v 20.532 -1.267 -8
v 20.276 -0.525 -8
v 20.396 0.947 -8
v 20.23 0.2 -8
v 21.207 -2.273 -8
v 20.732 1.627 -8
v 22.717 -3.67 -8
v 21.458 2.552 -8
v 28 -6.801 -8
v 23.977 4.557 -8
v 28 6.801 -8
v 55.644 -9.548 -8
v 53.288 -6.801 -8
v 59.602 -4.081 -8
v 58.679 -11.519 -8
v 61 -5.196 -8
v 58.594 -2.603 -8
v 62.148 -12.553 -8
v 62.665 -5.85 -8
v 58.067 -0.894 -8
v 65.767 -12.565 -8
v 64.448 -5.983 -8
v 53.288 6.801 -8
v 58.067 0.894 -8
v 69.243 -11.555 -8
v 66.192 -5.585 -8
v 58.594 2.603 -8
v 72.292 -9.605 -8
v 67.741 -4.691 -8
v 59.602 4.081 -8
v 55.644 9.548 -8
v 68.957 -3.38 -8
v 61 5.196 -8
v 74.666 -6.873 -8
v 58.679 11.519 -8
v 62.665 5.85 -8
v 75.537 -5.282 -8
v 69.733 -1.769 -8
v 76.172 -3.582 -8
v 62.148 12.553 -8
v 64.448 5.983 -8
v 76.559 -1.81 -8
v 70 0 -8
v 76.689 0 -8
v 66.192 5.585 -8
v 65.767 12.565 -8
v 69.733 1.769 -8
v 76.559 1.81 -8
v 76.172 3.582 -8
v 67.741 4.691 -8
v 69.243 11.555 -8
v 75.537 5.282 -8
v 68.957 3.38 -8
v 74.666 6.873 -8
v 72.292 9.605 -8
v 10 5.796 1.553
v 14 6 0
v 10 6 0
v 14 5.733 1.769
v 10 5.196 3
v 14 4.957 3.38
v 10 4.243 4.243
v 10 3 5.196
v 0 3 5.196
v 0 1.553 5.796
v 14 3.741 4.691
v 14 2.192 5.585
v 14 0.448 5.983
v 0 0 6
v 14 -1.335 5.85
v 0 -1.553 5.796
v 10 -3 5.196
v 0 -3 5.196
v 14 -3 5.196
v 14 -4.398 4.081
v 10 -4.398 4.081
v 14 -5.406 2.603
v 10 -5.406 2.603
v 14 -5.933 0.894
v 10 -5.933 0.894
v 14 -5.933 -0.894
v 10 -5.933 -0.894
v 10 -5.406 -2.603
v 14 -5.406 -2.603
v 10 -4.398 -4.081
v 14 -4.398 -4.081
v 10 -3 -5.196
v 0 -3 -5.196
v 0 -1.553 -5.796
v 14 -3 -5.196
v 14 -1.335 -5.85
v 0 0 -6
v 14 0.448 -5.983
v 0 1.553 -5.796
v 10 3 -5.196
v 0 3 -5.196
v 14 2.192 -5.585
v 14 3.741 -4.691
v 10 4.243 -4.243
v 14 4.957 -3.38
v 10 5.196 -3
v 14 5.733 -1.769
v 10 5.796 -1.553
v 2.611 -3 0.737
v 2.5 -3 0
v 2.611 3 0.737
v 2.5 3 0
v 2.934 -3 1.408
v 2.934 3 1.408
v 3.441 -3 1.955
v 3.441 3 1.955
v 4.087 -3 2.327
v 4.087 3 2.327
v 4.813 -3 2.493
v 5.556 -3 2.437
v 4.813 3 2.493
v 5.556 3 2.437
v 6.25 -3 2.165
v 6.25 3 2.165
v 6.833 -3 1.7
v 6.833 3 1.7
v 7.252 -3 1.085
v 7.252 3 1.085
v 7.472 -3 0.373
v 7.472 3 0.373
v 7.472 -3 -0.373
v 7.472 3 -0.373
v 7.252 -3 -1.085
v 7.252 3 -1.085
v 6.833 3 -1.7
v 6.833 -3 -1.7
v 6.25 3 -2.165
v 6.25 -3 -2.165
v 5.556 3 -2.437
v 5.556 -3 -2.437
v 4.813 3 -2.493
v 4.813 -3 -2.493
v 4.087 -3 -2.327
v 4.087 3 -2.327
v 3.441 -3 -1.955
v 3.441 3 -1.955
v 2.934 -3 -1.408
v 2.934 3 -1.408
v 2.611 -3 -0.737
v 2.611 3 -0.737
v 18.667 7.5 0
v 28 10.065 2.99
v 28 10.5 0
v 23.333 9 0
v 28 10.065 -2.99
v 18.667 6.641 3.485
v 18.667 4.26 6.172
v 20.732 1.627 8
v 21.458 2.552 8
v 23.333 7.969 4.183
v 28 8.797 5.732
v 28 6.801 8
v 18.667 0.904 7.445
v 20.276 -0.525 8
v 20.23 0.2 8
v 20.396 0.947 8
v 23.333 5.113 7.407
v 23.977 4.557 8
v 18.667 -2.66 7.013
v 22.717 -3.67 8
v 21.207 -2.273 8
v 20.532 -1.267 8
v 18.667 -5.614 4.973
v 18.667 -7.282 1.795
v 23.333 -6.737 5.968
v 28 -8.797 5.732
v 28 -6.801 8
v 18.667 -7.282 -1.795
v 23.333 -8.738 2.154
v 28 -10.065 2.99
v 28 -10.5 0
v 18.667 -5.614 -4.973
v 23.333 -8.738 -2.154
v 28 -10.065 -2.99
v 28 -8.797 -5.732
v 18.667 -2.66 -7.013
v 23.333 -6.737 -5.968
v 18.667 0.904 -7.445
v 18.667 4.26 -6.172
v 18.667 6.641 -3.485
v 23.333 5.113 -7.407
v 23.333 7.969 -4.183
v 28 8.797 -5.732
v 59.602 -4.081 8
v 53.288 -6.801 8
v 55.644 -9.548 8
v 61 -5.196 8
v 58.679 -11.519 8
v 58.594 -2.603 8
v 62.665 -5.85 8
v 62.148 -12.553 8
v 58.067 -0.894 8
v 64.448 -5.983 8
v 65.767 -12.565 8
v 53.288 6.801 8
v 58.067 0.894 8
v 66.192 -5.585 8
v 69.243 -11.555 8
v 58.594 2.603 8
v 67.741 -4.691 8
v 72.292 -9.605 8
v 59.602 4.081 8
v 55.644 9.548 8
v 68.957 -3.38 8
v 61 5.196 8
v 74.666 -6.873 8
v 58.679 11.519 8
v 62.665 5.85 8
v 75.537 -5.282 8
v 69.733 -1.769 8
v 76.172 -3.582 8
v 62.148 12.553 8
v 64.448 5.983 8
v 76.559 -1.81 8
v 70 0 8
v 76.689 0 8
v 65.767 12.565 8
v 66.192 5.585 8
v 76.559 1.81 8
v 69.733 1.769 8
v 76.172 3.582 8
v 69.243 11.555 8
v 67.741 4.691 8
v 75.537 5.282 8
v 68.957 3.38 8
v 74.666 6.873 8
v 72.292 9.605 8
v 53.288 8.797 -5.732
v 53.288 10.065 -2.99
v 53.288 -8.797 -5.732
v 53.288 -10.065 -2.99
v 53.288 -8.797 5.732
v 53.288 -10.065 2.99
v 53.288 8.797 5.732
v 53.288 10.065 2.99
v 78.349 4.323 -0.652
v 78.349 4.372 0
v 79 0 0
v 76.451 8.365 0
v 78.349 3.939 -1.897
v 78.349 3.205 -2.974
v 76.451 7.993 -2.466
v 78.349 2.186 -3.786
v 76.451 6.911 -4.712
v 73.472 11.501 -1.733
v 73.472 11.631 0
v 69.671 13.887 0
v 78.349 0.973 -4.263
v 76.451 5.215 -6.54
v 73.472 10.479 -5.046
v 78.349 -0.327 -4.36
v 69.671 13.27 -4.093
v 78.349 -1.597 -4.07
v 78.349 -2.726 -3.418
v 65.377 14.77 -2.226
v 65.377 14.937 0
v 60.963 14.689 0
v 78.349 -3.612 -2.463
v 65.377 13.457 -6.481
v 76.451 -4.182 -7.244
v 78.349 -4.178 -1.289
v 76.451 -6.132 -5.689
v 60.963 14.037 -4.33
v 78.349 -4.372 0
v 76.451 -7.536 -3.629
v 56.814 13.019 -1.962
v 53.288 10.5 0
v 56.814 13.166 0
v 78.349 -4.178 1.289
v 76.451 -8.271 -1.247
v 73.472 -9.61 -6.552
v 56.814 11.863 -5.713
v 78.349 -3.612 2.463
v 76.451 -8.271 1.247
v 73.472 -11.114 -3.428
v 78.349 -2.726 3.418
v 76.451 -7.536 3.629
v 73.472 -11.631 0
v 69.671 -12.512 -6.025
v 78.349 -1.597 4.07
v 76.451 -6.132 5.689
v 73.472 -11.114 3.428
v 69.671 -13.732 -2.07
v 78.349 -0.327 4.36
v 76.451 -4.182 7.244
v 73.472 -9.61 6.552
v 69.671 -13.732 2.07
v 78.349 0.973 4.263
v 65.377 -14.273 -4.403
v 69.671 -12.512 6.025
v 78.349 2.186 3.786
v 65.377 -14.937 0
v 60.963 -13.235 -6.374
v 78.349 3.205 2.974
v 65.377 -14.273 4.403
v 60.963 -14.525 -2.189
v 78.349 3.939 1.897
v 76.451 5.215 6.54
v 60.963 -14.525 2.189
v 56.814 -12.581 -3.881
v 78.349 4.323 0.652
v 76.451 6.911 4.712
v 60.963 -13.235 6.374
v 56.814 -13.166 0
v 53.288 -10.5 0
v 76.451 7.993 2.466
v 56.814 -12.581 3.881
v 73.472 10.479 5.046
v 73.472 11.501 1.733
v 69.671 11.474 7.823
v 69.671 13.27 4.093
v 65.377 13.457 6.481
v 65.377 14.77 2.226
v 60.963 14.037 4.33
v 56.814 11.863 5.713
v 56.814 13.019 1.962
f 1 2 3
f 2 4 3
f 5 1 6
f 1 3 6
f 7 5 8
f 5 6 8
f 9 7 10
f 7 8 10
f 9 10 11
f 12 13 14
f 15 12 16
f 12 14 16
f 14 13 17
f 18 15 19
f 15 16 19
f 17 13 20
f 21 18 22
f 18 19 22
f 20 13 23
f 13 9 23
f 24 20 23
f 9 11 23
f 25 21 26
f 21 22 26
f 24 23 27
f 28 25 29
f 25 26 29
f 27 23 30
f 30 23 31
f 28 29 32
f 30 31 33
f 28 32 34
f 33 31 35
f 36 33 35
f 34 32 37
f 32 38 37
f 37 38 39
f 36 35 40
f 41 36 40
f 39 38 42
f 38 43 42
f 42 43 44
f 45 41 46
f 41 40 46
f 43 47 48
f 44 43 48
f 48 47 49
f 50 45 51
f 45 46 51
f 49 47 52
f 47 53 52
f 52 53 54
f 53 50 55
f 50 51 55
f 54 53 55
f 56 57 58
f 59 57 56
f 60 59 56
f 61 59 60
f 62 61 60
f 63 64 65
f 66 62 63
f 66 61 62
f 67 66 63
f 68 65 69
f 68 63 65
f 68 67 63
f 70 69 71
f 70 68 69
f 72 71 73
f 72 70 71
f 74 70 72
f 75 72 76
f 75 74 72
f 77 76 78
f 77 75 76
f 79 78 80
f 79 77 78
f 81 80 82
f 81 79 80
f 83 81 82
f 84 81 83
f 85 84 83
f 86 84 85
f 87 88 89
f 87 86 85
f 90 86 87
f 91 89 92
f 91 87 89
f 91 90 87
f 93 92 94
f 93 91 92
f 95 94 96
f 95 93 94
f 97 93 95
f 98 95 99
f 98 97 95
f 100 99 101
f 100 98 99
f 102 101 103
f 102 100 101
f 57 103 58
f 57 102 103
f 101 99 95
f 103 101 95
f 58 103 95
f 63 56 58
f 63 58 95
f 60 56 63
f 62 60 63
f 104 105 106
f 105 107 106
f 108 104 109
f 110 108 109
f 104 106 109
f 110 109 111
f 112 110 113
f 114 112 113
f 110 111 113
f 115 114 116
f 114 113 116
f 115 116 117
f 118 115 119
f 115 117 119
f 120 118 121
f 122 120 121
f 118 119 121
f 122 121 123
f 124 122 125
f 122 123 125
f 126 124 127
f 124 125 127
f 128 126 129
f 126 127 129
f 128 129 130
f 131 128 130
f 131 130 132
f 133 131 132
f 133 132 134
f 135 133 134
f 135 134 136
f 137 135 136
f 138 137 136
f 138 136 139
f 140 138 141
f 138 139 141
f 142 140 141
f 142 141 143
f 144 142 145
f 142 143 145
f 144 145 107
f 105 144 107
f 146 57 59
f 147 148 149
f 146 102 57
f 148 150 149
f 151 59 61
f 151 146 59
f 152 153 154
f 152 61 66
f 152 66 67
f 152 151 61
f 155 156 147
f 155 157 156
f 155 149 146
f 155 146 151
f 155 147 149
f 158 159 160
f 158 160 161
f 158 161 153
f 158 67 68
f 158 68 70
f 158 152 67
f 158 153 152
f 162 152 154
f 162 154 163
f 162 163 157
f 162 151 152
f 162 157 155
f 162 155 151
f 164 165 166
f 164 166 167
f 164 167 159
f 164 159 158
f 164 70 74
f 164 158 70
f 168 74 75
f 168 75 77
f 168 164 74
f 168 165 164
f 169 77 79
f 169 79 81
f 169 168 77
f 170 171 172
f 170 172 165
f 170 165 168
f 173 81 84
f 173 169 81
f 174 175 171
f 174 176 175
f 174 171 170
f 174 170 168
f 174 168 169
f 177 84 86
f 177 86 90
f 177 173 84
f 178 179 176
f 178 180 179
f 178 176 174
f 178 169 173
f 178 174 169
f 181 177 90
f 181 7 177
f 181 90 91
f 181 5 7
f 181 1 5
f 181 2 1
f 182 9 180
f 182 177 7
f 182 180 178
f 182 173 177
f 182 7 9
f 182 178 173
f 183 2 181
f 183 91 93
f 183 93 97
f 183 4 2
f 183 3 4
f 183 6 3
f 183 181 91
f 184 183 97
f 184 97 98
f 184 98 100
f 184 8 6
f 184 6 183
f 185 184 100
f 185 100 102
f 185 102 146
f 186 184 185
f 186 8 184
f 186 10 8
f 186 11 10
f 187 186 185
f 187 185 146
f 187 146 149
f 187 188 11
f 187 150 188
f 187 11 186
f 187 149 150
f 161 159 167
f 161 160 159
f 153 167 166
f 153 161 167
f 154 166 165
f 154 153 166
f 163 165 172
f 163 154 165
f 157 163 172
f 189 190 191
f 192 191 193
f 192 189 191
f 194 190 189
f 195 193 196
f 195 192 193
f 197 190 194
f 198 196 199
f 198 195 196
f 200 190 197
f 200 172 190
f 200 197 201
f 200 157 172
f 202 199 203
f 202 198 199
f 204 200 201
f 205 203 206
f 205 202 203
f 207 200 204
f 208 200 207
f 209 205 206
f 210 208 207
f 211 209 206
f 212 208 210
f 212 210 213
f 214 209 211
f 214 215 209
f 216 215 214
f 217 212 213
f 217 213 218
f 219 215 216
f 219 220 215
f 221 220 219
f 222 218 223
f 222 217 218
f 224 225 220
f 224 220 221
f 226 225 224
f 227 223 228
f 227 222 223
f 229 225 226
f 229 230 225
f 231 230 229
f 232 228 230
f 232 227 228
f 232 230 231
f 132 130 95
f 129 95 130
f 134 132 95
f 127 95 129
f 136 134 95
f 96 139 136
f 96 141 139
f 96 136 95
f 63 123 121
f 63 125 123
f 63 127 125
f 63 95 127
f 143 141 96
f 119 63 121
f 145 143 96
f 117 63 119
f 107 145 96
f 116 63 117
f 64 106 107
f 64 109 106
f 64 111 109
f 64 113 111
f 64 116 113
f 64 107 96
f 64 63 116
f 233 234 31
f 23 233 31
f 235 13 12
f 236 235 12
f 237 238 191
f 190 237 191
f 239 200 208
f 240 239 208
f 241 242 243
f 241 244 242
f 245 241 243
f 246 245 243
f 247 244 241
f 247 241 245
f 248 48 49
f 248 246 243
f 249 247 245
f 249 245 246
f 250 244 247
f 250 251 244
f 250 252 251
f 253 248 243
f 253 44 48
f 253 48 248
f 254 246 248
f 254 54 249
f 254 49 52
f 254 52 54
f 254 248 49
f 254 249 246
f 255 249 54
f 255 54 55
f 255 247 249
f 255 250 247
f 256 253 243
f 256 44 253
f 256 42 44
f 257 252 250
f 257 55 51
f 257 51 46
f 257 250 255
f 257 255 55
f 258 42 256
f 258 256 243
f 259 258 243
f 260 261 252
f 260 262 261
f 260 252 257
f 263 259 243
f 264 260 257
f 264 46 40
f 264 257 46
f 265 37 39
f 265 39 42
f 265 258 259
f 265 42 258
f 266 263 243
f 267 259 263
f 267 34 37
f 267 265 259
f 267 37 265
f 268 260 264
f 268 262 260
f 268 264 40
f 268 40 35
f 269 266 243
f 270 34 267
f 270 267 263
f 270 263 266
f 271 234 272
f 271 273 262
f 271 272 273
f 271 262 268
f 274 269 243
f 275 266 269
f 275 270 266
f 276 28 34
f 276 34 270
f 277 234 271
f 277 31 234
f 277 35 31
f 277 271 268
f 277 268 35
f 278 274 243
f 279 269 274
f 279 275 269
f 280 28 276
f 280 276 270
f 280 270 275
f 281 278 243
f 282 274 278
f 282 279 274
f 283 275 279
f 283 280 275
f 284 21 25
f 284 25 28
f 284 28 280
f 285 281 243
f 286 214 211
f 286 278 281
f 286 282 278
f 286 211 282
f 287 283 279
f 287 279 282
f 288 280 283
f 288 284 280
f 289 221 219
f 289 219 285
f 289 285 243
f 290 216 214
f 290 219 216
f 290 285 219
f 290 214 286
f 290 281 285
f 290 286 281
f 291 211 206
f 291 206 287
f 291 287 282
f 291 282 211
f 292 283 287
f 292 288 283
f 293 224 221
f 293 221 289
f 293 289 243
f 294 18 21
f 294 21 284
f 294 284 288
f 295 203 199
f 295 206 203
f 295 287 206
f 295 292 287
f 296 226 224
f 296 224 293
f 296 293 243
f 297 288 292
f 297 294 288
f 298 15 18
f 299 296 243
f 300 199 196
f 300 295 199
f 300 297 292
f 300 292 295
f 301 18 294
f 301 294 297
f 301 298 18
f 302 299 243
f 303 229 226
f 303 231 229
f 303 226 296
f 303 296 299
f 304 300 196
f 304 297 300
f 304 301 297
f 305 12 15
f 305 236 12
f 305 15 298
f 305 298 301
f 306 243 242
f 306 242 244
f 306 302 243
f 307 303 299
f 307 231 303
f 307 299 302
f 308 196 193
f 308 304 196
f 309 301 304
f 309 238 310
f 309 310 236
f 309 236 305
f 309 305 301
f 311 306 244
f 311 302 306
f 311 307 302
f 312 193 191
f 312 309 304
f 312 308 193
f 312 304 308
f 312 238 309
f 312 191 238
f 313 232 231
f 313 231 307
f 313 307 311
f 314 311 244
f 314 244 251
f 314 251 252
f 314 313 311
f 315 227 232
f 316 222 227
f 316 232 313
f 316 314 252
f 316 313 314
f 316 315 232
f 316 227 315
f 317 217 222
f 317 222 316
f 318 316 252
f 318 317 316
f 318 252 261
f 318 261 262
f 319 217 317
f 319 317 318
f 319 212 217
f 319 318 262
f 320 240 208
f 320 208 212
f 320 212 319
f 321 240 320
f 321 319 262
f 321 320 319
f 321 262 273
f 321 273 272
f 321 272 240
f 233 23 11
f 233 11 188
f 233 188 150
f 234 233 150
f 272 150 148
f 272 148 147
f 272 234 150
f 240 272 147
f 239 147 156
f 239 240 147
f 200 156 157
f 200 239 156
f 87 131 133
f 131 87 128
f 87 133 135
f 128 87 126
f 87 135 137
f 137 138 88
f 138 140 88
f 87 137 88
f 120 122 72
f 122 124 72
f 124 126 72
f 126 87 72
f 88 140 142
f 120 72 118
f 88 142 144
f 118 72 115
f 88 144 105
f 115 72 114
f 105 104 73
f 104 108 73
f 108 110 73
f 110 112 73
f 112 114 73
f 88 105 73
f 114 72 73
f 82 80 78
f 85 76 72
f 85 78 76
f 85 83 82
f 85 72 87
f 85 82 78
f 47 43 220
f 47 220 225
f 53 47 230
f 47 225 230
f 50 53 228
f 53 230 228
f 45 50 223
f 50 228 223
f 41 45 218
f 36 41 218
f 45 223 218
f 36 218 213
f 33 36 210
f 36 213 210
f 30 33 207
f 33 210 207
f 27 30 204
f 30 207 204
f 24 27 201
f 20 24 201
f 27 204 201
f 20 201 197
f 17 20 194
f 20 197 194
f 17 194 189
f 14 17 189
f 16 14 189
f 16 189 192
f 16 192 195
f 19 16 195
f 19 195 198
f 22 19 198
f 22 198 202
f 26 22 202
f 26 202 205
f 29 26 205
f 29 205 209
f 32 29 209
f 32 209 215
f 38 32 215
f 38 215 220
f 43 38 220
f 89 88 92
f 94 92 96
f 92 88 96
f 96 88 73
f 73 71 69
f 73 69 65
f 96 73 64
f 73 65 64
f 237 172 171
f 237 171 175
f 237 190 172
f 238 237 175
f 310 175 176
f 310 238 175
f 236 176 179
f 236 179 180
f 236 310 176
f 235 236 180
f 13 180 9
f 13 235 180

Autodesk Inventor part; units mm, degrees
sketch "Szkic1" plane through (0, 0, 0) normal (0, 0, 1) x (1, 0, 0)
  line L0 (0, 6) -> (14, 6)
  line L1 (14, 6) -> (14, 0)
  line L2 (14, 6) -> (28, 10.5)
  line L3 (28, 10.5) -> (28, 0)
  line L4 (28, 10.5) -> (53.2879, 10.5)
  circle A0 centre (64, 0) radius 15
  line L5 (0, 6) -> (0, 0)
  line L6 (0, 0) -> (79, 0)
  dimension "d5" = 30
  dimension "d6" = 14
  dimension "d7" = 14
  dimension "d8" = 64
  dimension "d13" = 12
  dimension "d14" = 21
revolve "Obrót1" add sketch "Szkic1" angle 360 about axis through (0, 0, 0) along (1, 0, 0) picked at (60.2352, 8.4613) contours L0 L1 L6 L5 | L2 L3 L6 L1 | L4 A0 L6 L3 | A0 L6
ref_plane "Płaszczyzna konstrukcyjna1" through (64, 0, -15) normal (0, 0, 1) x (1, 0, 0)
ref_plane "Płaszczyzna konstrukcyjna3" through (64, 0, 0) normal (0, 0, 1) x (1, 0, 0)
ref_plane "Płaszczyzna konstrukcyjna2" through (64, 0, 15) normal (0, 0, 1) x (1, 0, 0)
ref_plane "Płaszczyzna konstrukcyjna4" through (64, 0, 8) normal (0, 0, 1) x (1, 0, 0)
ref_plane "Płaszczyzna konstrukcyjna5" through (64, 0, -8) normal (0, 0, 1) x (1, 0, 0)
sketch "Szkic2" plane through (64, 0, -8) normal (0, 0, 1) x (1, 0, 0)
  line L0 (18, 16) -> (-68, 16)
  line L1 (-68, 16) -> (-68, -17)
  line L2 (-68, -17) -> (18, -17)
  line L3 (18, -17) -> (18, 16)
  point P0 (-64, 0)
extrude "Wyciągnięcie proste1" cut sketch "Szkic2" against normal blind 10
sketch "Szkic3" plane through (64, 0, 8) normal (0, 0, 1) x (1, 0, 0)
  line L0 (20, 22) -> (-75, 22)
  line L1 (-75, 22) -> (-75, -17)
  line L2 (-75, -17) -> (20, -17)
  line L3 (20, -17) -> (20, 22)
  point P0 (-64, 0)
extrude "Wyciągnięcie proste2" cut sketch "Szkic3" along normal blind 10
sketch "Szkic4" plane through (64, 0, 8) normal (0, 0, 1) x (1, 0, 0)
  arc A0 (-10.7121, -10.5) -> (-10.7121, 10.5) centre (0, 0) ccw projected
  circle A1 centre (0, 0) radius 6
  point P0 (-64, 0)
  dimension "d19" = 12
extrude "Wyciągnięcie proste3" cut sketch "Szkic4" against normal up to surface (16 mm away)
ref_plane "Płaszczyzna konstrukcyjna6" through (7, 6, 0) normal (0, 1, 0) x (-1, 0, 0)
sketch "Szkic5" plane through (7, 6, 0) normal (0, 1, 0) x (-1, 0, 0)
  line L0 (7, 6) -> (7, -6) projected
  line L1 (7, -6) -> (-7, -6) projected
  line L2 (-7, 6) -> (-7, -6) projected
  line L3 (7, 6) -> (-7, 6) projected
  line L4 (7, -6) -> (-3, -6)
  line L5 (-3, -6) -> (-3, 6)
  line L6 (-3, 6) -> (7, 6)
  line L7 (7, 6) -> (7, -6)
  point P0 (7, 0)
  point P1 (-3, -6)
  dimension "d22" = 10
extrude "Wyciągnięcie proste4" cut sketch "Szkic5" against normal blind 3 contours L0 L1 L5 L3
ref_plane "Płaszczyzna konstrukcyjna7" through (7, 6, 0) normal (0, 1, 0) x (-1, 0, 0)
ref_plane "Płaszczyzna konstrukcyjna8" through (7, -6, 0) normal (0, 1, 0) x (-1, 0, 0)
sketch "Szkic6" plane through (7, -6, 0) normal (0, 1, 0) x (-1, 0, 0)
  point P0 (7, 0)
sketch "Szkic7" plane through (7, -6, 0) normal (0, 1, 0) x (-1, 0, 0)
  line L0 (7, 6) -> (-3, 6)
  line L1 (-3, 6) -> (-3, -6)
  line L2 (-3, -6) -> (7, -6)
  line L3 (7, -6) -> (7, 6)
  point P0 (7, 0)
extrude "Wyciągnięcie proste5" cut sketch "Szkic7" along normal blind 3
sketch "Szkic8" plane through (7, 6, 0) normal (0, 1, 0) x (-1, 0, 0)
  circle A0 centre (2, 0) radius 2.5
  line L0 (7, 5.1962) -> (7, -5.1962) projected
  point P0 (7, 0)
  dimension "d28" = 5
  dimension "d29" = 5
extrude "Wyciągnięcie proste6" cut sketch "Szkic8" against normal through all
properties part number "Bartosz_Zukowski_walek_04_10"
